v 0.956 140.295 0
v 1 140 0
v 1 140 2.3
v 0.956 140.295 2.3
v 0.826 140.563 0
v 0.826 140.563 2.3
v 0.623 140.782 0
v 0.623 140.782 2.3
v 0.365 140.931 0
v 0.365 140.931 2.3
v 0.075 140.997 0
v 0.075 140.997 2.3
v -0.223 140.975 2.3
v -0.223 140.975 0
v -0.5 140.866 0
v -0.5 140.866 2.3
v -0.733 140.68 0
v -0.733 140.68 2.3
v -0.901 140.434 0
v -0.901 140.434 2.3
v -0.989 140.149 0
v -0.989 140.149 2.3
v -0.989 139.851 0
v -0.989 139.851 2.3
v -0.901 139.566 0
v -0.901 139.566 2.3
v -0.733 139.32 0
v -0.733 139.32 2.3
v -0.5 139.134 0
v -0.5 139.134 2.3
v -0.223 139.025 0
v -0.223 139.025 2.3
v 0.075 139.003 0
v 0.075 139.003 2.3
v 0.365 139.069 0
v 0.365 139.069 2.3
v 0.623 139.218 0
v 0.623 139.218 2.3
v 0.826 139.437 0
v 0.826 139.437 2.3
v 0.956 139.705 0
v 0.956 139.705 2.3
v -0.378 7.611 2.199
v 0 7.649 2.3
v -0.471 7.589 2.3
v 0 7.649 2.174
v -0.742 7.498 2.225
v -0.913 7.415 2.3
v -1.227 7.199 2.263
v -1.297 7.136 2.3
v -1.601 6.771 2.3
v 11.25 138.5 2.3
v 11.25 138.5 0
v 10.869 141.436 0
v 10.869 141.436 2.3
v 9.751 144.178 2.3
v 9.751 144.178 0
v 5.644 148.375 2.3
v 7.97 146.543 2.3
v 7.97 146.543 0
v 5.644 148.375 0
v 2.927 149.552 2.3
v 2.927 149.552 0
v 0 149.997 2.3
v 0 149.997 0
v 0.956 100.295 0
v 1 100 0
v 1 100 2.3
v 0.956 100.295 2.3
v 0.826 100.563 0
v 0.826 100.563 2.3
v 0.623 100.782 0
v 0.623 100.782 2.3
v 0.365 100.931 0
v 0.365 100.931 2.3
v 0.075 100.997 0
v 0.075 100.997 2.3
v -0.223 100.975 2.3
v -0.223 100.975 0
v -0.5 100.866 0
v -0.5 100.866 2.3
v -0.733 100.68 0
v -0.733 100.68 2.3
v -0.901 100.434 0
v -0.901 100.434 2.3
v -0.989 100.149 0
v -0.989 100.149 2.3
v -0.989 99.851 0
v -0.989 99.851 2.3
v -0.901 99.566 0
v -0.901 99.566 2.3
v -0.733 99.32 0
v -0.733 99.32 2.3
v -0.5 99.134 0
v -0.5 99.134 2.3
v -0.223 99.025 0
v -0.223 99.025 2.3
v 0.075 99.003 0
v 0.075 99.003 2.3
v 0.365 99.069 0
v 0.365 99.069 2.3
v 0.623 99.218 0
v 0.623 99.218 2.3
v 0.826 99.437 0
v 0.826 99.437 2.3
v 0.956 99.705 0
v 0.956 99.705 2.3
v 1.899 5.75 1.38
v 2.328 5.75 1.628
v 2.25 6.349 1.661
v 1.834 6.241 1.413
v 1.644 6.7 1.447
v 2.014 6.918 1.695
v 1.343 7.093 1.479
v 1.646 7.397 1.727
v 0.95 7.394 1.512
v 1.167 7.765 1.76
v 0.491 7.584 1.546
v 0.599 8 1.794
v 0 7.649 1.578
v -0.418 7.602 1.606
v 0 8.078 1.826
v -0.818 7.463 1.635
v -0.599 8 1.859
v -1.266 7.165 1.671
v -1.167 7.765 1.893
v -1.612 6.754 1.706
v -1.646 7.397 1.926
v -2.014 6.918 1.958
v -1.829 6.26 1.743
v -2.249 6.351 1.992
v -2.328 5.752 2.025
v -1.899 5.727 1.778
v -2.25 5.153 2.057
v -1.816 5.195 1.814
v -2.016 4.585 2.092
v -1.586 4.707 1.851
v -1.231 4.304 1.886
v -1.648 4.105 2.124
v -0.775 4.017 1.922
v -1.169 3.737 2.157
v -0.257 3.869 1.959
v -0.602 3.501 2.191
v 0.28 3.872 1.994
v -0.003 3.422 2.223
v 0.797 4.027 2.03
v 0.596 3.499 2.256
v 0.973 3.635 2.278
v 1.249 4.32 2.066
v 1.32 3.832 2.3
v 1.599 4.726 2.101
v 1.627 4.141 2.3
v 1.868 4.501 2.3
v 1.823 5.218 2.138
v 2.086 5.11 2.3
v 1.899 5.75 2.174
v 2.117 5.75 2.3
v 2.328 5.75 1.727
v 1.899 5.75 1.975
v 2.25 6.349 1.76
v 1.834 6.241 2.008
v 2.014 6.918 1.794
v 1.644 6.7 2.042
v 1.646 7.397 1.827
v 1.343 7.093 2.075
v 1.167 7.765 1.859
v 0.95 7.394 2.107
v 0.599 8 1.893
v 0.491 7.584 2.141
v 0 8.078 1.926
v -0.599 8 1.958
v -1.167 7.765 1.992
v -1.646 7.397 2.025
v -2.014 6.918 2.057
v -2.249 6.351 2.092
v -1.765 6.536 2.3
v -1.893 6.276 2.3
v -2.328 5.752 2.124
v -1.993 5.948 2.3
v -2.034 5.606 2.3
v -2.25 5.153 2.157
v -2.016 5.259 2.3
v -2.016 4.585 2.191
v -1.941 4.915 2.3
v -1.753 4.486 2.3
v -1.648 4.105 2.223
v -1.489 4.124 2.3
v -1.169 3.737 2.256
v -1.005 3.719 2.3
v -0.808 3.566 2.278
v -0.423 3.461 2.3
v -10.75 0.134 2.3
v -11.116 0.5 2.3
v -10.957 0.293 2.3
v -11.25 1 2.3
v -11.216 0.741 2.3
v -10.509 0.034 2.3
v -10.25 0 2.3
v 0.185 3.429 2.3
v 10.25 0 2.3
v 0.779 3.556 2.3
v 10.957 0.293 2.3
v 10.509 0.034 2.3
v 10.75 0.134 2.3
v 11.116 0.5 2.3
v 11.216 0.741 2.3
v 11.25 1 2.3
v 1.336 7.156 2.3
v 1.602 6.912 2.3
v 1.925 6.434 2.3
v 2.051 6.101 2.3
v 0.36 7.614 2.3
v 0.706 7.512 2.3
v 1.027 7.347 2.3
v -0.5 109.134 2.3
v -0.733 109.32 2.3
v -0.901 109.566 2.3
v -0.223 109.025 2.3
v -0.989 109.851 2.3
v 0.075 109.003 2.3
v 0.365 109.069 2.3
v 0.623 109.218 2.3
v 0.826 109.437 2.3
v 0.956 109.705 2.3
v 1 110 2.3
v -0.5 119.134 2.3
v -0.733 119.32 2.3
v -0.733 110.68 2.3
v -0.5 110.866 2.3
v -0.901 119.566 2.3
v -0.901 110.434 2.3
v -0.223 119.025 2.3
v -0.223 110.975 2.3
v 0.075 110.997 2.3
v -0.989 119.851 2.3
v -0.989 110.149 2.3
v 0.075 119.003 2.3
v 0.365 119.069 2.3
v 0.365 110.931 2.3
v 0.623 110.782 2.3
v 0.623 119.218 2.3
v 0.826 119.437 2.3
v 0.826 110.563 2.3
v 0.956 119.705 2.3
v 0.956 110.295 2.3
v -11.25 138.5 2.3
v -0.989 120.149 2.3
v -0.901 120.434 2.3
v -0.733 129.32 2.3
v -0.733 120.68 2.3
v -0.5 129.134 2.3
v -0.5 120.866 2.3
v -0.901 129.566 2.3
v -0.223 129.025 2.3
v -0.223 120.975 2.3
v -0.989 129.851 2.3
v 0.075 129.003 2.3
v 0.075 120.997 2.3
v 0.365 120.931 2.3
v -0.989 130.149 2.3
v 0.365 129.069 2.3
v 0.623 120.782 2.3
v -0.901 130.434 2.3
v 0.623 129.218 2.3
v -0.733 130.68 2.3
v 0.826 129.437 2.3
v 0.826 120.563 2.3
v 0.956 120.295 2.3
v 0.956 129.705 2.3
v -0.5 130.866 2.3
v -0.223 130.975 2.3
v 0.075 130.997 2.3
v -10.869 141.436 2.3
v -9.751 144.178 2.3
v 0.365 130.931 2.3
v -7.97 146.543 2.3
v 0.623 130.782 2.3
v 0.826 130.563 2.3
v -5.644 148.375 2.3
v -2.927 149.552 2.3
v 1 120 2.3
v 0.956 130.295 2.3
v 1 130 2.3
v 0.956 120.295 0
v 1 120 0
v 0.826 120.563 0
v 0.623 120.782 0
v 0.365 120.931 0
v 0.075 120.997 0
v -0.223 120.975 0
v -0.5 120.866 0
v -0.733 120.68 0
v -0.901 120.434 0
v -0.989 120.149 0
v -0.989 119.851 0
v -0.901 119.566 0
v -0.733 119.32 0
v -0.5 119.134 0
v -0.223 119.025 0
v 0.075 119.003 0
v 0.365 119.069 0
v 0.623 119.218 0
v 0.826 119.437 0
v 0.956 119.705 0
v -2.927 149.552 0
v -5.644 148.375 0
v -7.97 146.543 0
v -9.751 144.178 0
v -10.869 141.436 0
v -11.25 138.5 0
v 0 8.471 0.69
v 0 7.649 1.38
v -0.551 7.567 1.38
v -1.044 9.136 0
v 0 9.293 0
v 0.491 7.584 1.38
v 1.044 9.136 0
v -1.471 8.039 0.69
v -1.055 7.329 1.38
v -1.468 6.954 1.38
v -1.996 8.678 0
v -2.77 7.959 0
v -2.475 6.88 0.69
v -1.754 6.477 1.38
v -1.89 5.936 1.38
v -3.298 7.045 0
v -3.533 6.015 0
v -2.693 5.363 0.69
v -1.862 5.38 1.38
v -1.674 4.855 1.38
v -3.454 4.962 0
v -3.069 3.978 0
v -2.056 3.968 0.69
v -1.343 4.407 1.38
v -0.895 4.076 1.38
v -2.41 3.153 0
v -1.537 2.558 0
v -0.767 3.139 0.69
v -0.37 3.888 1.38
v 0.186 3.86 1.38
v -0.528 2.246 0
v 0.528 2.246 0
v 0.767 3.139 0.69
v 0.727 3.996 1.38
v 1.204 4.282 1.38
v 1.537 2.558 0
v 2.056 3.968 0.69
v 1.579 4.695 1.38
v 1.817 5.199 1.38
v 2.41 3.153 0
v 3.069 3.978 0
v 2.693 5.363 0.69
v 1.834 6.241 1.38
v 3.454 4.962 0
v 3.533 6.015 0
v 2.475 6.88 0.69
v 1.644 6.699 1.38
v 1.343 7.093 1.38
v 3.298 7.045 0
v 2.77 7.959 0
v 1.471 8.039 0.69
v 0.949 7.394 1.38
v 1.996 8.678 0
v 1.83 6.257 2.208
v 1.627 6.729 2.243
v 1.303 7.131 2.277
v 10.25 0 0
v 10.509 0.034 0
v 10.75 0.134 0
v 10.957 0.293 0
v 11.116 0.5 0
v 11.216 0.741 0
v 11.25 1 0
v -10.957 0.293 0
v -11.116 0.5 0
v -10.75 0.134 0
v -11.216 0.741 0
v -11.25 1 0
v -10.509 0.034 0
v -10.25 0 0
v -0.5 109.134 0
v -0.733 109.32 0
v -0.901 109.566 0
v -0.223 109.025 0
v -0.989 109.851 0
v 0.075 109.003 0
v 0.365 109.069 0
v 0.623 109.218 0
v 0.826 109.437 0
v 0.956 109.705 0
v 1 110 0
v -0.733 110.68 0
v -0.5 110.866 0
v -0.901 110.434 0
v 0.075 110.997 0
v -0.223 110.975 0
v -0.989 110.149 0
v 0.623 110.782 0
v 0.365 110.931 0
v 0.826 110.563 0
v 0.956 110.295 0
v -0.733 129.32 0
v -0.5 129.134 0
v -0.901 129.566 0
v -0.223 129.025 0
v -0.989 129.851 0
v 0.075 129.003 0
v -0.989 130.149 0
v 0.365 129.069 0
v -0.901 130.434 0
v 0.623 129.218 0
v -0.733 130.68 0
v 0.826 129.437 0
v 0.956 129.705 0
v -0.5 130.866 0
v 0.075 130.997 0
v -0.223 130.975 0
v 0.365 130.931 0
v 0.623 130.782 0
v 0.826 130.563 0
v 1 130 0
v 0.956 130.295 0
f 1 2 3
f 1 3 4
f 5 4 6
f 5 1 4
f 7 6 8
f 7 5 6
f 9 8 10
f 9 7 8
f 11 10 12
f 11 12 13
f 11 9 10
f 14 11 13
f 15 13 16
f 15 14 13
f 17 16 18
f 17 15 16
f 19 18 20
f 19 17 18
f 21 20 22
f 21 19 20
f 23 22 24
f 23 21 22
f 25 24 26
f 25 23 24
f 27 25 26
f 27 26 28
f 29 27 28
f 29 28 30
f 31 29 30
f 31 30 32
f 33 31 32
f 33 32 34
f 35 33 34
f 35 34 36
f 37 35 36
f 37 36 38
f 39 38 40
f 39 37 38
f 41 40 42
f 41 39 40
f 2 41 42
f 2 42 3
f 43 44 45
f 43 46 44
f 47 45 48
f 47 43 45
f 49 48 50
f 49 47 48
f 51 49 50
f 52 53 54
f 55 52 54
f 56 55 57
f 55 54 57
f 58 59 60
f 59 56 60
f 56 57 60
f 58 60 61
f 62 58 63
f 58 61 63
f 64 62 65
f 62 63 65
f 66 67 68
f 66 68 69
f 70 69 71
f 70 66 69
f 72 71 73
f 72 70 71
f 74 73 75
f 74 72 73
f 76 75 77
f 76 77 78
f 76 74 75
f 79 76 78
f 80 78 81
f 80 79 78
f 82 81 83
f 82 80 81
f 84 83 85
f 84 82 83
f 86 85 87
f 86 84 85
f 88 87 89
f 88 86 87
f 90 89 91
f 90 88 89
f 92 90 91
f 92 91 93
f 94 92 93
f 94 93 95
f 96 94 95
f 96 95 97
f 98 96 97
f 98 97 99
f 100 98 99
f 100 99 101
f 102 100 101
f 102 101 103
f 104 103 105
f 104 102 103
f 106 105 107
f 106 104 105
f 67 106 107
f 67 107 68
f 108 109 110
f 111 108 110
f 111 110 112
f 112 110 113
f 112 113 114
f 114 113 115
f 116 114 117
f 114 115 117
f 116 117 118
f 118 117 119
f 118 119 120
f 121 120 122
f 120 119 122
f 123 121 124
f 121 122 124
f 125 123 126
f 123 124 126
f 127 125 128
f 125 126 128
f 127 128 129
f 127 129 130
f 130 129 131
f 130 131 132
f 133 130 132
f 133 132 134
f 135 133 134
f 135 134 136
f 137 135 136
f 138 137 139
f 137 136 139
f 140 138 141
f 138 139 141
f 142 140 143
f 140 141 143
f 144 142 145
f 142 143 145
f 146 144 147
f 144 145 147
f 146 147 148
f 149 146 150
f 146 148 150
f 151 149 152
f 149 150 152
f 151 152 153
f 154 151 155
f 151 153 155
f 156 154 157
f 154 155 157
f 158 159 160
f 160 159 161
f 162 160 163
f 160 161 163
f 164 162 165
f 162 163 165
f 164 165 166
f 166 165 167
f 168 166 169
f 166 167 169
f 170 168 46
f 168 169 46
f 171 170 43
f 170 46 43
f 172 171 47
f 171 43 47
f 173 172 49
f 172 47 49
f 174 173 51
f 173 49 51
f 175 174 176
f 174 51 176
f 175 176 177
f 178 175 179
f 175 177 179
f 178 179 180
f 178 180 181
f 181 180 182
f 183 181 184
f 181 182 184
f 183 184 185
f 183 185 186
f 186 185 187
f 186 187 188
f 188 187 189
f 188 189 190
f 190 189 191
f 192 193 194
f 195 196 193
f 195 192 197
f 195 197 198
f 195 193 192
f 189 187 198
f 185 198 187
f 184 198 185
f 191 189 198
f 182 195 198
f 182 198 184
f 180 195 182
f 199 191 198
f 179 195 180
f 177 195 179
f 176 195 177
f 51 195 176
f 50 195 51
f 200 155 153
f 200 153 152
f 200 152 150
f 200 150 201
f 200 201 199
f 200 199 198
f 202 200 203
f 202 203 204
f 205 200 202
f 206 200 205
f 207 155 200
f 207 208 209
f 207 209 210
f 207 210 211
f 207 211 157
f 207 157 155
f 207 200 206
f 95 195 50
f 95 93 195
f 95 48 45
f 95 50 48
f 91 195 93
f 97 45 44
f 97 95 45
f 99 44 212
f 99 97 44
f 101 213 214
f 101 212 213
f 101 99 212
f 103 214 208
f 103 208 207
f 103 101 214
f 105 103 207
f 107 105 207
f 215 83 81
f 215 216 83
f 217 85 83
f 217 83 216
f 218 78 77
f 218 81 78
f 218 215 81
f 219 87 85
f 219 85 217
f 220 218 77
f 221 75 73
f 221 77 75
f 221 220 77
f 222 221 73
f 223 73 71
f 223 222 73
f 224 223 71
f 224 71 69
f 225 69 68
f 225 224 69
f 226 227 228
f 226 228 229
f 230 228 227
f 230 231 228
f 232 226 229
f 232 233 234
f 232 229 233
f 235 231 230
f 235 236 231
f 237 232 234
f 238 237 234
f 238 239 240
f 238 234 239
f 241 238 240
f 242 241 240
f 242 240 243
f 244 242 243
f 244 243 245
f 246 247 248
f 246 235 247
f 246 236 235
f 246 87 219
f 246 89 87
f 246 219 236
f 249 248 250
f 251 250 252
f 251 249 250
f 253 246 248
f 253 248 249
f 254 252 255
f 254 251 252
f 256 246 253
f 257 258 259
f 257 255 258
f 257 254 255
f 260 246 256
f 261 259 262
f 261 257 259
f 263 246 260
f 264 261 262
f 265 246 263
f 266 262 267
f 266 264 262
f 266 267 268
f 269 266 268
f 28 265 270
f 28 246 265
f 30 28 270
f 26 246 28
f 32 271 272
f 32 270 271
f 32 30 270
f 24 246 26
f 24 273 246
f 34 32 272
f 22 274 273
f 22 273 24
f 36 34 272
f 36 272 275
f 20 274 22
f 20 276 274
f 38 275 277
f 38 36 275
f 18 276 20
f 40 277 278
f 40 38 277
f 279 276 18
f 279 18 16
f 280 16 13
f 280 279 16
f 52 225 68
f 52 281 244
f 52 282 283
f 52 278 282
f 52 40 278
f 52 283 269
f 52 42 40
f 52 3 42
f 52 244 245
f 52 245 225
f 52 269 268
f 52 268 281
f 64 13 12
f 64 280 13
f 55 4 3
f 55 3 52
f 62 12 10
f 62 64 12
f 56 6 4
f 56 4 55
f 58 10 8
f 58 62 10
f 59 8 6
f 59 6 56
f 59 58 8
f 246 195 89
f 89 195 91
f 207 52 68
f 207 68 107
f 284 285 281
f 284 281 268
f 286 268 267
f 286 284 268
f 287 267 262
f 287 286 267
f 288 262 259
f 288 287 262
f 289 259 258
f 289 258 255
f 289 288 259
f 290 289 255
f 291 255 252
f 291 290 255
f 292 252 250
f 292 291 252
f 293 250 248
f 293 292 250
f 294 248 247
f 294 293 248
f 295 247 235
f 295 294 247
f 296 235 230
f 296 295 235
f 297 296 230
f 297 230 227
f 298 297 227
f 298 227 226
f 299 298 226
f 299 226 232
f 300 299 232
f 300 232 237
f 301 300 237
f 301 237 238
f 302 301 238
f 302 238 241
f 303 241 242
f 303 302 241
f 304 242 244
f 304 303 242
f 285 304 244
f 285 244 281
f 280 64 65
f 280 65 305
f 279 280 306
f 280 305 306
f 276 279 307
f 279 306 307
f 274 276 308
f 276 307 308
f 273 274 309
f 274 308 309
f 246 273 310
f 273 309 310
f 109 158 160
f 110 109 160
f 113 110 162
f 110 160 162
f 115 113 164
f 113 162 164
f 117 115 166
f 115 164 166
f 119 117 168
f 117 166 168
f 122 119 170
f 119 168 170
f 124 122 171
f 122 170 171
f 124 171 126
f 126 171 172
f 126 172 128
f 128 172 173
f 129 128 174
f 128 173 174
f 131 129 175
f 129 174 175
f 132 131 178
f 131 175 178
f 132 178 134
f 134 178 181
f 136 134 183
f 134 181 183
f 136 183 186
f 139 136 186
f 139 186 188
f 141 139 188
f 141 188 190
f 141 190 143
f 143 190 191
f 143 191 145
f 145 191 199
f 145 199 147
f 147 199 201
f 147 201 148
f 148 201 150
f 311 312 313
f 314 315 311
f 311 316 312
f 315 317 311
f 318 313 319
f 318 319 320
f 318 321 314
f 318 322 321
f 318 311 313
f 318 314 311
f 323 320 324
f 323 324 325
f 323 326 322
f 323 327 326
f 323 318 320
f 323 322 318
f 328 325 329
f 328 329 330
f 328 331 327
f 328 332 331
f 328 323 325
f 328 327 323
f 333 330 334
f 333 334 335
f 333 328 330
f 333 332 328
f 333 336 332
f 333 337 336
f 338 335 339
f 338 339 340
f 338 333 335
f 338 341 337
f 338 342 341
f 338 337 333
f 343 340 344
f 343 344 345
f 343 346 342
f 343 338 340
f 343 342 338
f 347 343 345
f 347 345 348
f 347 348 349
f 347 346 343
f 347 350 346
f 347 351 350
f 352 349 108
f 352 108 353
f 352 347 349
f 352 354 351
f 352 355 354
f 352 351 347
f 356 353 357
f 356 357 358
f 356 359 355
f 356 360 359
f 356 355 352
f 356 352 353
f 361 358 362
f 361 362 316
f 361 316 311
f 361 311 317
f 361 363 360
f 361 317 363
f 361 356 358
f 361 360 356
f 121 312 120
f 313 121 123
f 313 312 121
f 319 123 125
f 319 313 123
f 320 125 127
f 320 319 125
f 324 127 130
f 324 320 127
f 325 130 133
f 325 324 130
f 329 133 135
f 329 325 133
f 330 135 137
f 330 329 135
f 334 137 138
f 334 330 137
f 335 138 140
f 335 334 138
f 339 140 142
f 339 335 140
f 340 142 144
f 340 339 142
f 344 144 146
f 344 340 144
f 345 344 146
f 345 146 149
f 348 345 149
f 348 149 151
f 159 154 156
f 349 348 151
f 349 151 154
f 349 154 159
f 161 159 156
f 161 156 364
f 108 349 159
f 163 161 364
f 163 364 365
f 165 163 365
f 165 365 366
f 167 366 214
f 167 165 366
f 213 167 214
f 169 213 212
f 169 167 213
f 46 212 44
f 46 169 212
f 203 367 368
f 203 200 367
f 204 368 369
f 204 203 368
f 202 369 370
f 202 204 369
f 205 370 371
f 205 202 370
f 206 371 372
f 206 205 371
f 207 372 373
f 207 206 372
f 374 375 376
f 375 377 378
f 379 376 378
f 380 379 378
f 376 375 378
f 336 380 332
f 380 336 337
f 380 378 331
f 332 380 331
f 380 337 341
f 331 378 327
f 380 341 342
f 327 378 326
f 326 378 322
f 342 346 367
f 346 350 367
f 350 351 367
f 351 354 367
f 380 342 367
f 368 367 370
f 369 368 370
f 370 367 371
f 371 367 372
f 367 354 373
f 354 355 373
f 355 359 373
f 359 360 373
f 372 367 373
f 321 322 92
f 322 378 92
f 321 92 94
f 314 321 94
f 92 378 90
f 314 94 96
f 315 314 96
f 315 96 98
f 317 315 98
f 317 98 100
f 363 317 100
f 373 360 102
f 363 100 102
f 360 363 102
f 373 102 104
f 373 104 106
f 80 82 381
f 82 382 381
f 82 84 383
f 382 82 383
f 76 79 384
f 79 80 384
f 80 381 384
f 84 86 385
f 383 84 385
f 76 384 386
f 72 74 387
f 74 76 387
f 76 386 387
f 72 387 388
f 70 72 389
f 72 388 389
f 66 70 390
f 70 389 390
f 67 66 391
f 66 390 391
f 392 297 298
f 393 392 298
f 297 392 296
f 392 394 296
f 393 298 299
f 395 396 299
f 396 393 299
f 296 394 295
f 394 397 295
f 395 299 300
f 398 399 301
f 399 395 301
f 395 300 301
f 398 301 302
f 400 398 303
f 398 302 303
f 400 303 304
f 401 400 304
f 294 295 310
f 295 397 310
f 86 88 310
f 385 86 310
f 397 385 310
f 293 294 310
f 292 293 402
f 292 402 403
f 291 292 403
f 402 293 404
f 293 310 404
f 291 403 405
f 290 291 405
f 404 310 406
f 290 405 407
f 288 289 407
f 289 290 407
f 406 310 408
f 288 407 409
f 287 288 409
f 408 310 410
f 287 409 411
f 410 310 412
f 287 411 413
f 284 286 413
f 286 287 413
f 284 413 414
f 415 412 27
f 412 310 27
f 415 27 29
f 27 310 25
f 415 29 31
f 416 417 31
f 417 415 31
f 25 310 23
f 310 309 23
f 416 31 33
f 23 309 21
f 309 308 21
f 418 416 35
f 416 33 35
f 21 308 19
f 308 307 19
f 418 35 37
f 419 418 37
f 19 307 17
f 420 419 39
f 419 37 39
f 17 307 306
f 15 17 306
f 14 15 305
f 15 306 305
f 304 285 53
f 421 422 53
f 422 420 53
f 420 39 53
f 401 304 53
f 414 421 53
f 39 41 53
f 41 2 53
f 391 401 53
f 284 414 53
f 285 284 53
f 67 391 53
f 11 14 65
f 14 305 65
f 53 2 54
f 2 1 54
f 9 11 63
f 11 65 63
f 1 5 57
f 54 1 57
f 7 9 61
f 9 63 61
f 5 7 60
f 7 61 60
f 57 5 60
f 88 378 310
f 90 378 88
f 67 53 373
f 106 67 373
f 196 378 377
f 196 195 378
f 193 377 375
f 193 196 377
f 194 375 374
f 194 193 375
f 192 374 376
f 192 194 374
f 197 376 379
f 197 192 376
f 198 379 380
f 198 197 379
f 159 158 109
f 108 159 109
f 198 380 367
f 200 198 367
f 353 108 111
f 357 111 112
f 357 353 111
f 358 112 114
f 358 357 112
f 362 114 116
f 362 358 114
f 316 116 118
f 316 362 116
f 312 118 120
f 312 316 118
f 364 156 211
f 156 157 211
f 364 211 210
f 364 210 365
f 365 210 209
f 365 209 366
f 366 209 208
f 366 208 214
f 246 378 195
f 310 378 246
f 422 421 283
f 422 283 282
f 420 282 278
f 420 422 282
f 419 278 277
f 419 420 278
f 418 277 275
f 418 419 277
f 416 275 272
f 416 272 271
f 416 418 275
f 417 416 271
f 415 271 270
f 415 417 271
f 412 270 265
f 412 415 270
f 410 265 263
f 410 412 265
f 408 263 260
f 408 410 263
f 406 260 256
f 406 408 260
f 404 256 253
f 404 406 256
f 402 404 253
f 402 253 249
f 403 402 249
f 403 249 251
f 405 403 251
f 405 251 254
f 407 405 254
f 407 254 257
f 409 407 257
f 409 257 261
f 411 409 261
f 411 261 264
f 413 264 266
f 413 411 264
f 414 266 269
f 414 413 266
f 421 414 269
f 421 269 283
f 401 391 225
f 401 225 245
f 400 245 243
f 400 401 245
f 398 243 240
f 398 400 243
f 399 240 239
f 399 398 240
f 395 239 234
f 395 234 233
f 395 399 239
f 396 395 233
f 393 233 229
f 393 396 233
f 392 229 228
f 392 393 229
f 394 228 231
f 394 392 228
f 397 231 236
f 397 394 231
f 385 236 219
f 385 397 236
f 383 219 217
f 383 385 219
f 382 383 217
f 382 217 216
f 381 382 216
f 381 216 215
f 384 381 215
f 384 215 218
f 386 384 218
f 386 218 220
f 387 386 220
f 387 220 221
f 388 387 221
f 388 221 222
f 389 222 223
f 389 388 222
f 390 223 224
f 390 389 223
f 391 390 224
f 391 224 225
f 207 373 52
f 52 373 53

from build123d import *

# Parameters (mm, degrees)
SKETCH1_W           = 22.5
SKETCH1_H           = 150
SKETCH1_R           = 1
BOSS_EXTRUDE1_DEPTH = 2.3
FILLET1_R           = 11.5
THREAD1_PITCH       = 0.79375
FILLET2_R           = 1


with BuildPart() as part:
    # Sketch1 → Boss-Extrude1 (new body)
    with BuildSketch(Plane.XY):
        with Locations((0, 75)):
            Rectangle(SKETCH1_W, SKETCH1_H)
        with Locations((0, 140)):
            Circle(SKETCH1_R, mode=Mode.SUBTRACT)
        with Locations((0, 130)):
            Circle(SKETCH1_R, mode=Mode.SUBTRACT)
        with Locations((0, 120)):
            Circle(SKETCH1_R, mode=Mode.SUBTRACT)
        with Locations((0, 110)):
            Circle(SKETCH1_R, mode=Mode.SUBTRACT)
        with Locations((0, 100)):
            Circle(SKETCH1_R, mode=Mode.SUBTRACT)
    extrude(amount=BOSS_EXTRUDE1_DEPTH)

    # Fillet1
    # the kernel refuses this fillet: 11.5 mm, written as the material it takes off along each edge
    with BuildSketch(Plane(origin=(11.25, 150, -28.75), x_dir=(0, -1, 0), z_dir=(0, 0, 1)), Plane(origin=(-11.25, 150, -28.75), x_dir=(1, 0, 0), z_dir=(0, 0, 1))) as fillet1_piece_1:
        with BuildLine():
            CenterArc((FILLET1_R, -FILLET1_R), FILLET1_R, 90, 90)
            Line((0, -FILLET1_R), (0, 0))
            Line((0, 0), (FILLET1_R, 0))
        make_face()
    extrude(amount=59.8, mode=Mode.SUBTRACT)

    # Sketch3 → CSK for #6 Flat Head Machine Screw (100)1 (revolve, cut)
    with BuildSketch(Plane(origin=(0, 5.75, 0), x_dir=(0, 1, 0), z_dir=(1, 0, 0))):
        Polygon((0, 0), (0, 2.3), (1.89865, 2.3), (1.89865, 1.380025208), (3.5433, 0), align=None)
    revolve(axis=Axis((0, 5.75, -6.35), (0, 0, 1)), mode=Mode.SUBTRACT)

    # Thread1: the profile of Thread Profile1 profile screwed along a right-hand helix of 1.159023 turns, 8 arcs to a turn; built about Z, then put on its axis
    thread1_z = Axis((0, 0, 0), (0, 0, 1))
    thread1_corners = [(1.89835, 0, -0.000173205), (2.328279788, 0, 0.248046874), (2.328279788, 0, 0.347265624), (1.89835, 0, 0.595485703)]
    with BuildLine(mode=Mode.PRIVATE) as thread1_profile:
        Line(thread1_corners[0], thread1_corners[1])
        Line(thread1_corners[1], thread1_corners[2])
        Line(thread1_corners[2], thread1_corners[3])
        Line(thread1_corners[3], thread1_corners[0])
    thread1_cap = Face(thread1_profile.wire())
    thread1_turn_angles = [0, 22.5, 45, 67.5, 90, 112.5, 135, 157.5, 180, 202.5, 225, 247.5, 270, 292.5, 315, 337.5, 360]
    thread1_turn_weights = [1, 0.9238795325112867, 1, 0.9238795325112867, 1, 0.9238795325112867, 1, 0.9238795325112867, 1, 0.9238795325112867, 1, 0.9238795325112867, 1, 0.9238795325112867, 1, 0.9238795325112867, 1]
    thread1_turn_rails = [Edge.make_bspline([Vector(p[0], p[1], 0).rotate(thread1_z, thread1_turn_angles[k]) / thread1_turn_weights[k] + Vector(0, 0, p[2] + THREAD1_PITCH * thread1_turn_angles[k] / 360) for k in range(17)], [0, 0, 0, 1, 1, 2, 2, 3, 3, 4, 4, 5, 5, 6, 6, 7, 7, 8, 8, 8], 2, thread1_turn_weights) for p in thread1_corners]
    thread1_turn_sides = [Face.make_surface_from_curves(thread1_turn_rails[p[0]], thread1_turn_rails[p[1]]) for p in [(0, 1), (1, 2), (2, 3), (3, 0)]]
    thread1_last_angles = [360, 382.5, 405, 411.124204706, 417.248409411]
    thread1_last_weights = [1, 0.9238795325112867, 1, 0.9942929639578035, 1]
    thread1_last_rails = [Edge.make_bspline([Vector(p[0], p[1], 0).rotate(thread1_z, thread1_last_angles[k]) / thread1_last_weights[k] + Vector(0, 0, p[2] + THREAD1_PITCH * thread1_last_angles[k] / 360) for k in range(5)], [0, 0, 0, 1, 1, 2, 2, 2], 2, thread1_last_weights) for p in thread1_corners]
    thread1_last_sides = [Face.make_surface_from_curves(thread1_last_rails[p[0]], thread1_last_rails[p[1]]) for p in [(0, 1), (1, 2), (2, 3), (3, 0)]]
    thread1 = Plane(origin=(0, 5.75, 1.380025208), x_dir=(1, 0, 0), z_dir=(0, 0, 1)) * Solid(Shell([*thread1_turn_sides, *thread1_last_sides, thread1_cap, thread1_cap.rotate(thread1_z, 417.248409411).moved(Location((0, 0, THREAD1_PITCH * 417.248409411 / 360)))]))
    add(thread1, mode=Mode.SUBTRACT)

    # Fillet2
    fillet2_edges = [part.edges().sort_by_distance(p)[0] for p in [
        (11.25, 0, 1.15),
        (-11.25, 0, 1.15),
    ]]
    fillet(fillet2_edges, radius=FILLET2_R)


solid = part.part
